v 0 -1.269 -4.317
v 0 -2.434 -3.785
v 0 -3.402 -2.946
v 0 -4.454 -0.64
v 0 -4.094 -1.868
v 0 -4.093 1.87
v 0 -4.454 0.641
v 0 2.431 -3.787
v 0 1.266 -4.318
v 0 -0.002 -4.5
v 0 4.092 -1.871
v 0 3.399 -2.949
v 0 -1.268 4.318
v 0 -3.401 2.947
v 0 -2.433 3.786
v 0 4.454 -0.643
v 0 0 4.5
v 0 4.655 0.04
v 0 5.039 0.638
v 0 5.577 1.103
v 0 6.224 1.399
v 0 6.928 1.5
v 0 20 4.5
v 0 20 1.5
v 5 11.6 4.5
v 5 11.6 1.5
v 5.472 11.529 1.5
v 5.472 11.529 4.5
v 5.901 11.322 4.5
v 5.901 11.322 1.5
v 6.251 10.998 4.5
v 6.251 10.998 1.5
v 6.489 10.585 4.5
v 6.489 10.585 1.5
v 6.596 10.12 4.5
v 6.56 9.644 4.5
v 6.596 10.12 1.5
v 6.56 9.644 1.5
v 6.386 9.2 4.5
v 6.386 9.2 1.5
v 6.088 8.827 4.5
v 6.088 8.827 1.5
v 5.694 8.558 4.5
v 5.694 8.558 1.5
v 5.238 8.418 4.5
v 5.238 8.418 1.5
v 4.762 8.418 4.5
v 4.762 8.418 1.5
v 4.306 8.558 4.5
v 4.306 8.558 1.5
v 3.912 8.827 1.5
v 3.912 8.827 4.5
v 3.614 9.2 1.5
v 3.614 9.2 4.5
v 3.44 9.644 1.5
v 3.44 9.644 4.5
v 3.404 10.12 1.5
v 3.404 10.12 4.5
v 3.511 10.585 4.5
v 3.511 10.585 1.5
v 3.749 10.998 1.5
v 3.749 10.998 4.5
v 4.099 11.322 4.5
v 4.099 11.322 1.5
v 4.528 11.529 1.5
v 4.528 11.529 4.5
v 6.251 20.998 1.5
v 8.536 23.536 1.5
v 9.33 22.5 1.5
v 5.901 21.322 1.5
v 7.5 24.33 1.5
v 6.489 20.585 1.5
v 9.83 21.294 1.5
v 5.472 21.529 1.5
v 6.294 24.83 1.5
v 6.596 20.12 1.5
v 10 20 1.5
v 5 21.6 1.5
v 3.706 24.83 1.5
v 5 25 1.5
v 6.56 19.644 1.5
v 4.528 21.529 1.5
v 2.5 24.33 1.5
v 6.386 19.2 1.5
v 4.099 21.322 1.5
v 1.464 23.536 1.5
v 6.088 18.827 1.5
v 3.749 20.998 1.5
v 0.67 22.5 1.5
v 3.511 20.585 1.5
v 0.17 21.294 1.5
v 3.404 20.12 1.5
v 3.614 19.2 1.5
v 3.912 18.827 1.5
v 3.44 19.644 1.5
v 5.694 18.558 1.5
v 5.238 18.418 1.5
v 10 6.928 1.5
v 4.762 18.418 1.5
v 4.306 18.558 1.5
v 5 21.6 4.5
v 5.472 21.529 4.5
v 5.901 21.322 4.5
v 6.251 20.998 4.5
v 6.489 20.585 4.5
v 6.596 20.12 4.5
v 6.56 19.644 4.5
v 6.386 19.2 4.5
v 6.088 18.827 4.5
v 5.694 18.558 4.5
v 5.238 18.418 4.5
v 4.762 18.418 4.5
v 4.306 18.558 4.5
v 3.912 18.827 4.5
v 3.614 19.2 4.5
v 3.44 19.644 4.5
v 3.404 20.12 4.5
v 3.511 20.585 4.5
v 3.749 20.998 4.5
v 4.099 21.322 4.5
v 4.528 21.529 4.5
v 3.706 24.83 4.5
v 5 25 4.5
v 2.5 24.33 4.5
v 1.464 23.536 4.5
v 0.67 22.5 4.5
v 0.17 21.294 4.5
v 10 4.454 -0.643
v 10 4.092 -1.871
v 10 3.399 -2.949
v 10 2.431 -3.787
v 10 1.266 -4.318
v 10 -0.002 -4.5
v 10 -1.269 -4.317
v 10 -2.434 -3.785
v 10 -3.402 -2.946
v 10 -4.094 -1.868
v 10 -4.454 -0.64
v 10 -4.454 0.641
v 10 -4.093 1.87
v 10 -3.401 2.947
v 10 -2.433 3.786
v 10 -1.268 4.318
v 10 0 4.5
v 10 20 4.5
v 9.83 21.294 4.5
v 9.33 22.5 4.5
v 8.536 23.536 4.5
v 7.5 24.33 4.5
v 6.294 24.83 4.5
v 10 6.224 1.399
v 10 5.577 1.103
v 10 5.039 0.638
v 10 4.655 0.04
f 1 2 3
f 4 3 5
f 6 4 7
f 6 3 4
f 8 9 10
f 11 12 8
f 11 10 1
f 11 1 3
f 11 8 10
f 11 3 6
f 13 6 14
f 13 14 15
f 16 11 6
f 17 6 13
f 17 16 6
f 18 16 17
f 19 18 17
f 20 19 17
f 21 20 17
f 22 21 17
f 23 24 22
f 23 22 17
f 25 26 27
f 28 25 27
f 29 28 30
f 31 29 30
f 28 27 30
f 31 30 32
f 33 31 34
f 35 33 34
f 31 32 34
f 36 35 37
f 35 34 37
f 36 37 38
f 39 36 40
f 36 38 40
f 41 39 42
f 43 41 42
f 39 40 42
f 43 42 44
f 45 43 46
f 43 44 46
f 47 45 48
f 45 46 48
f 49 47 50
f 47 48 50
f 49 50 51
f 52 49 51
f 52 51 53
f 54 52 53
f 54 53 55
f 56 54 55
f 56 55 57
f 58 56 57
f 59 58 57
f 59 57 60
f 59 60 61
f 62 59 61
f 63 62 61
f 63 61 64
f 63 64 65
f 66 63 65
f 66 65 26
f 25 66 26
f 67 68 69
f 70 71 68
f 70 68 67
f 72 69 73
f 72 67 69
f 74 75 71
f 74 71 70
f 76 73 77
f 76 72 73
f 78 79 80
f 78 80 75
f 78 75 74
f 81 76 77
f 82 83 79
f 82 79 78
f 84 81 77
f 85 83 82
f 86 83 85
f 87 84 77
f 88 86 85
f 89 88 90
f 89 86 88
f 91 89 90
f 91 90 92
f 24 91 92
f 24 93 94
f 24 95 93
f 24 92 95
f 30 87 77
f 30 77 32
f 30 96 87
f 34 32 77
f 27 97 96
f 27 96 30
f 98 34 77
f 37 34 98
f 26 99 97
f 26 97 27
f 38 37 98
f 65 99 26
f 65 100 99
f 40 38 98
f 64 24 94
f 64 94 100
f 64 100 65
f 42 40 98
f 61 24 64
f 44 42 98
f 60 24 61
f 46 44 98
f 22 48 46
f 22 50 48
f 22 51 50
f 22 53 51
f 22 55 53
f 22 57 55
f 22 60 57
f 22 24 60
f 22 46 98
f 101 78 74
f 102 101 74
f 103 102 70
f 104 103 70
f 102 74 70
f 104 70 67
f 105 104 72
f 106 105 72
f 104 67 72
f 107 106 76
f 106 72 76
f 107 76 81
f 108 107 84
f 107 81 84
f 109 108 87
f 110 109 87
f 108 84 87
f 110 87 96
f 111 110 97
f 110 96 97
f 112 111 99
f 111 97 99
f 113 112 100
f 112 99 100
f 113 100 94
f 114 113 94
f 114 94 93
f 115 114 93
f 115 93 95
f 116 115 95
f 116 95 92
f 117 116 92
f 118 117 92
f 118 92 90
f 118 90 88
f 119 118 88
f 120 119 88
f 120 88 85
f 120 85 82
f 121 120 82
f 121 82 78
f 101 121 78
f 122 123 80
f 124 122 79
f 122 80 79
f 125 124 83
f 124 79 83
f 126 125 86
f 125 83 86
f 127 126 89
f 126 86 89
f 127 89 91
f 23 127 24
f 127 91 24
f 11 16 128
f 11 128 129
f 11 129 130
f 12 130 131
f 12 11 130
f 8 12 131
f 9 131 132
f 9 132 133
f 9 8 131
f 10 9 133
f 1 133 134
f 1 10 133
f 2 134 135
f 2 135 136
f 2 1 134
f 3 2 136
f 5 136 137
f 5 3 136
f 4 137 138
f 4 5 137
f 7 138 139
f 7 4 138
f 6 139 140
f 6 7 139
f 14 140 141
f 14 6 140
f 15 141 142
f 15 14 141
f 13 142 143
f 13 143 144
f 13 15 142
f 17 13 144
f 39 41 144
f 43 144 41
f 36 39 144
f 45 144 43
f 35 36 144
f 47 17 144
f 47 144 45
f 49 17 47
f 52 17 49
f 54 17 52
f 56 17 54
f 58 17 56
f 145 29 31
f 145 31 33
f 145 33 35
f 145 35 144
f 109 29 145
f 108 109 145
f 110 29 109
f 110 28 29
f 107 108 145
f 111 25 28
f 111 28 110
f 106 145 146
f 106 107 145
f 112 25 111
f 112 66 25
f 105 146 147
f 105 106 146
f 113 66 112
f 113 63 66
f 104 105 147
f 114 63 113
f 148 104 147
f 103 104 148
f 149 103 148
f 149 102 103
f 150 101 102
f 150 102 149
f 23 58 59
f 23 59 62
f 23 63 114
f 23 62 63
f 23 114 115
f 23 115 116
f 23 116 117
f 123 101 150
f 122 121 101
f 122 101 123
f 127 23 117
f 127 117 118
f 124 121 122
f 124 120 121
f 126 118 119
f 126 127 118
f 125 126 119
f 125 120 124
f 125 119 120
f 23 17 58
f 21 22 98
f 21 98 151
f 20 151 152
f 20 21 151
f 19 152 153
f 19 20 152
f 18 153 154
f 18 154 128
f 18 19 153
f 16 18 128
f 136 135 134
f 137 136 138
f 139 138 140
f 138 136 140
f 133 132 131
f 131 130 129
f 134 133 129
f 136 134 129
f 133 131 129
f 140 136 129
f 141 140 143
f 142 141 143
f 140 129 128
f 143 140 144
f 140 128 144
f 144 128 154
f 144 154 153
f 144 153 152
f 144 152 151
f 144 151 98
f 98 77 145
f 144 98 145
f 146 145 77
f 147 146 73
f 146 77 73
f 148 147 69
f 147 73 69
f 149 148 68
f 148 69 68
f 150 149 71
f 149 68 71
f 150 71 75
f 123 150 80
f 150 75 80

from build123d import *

# Parameters (mm, degrees)
EXTRUDE_1_DEPTH     = 10
SKETCH_3_R          = 1.6
CUT_EXTRUDE_1_DEPTH = 28.586228448


with BuildPart() as part:
    # 草图2 → 凸台-拉伸1 (new body)
    with BuildSketch(Plane(origin=(0, 0, 0), x_dir=(0, 0, -1), z_dir=(1, 0, 0))):
        with BuildLine():
            Line((-4.5, 25), (-1.5, 25))
            Line((-1.5, 25), (-1.5, 6.92820323))
            ThreePointArc((-1.5, 6.92820323), (-0.889822365, 5.291569054), (0.642857143, 4.453844934))
            ThreePointArc((0.642857143, 4.453844934), (2.945941518, -3.401680257), (-4.5, 0))
            Line((-4.5, 0), (-4.5, 25))
        make_face()
    extrude(amount=EXTRUDE_1_DEPTH)

    # 草图3 → 切除-拉伸1 (cut, through all)
    with BuildSketch(Plane(origin=(0, 0, 1.5), x_dir=(-1, 0, 0), z_dir=(0, 0, -1))):
        with BuildLine():
            Line((-10, 25), (-10, 20))
            ThreePointArc((-10, 20), (-8.535533906, 23.535533906), (-5, 25))
            Line((-5, 25), (-10, 25))
        make_face()
        with BuildLine():
            Line((0, 25), (-5, 25))
            ThreePointArc((-5, 25), (-1.464466094, 23.535533906), (0, 20))
            Line((0, 20), (0, 25))
        make_face()
        with Locations(Location((-5, 20, 0), (0, 0, 90))):
            Circle(SKETCH_3_R)
        with Locations(Location((-5, 10, 0), (0, 0, 90))):
            Circle(SKETCH_3_R)
    extrude(amount=-CUT_EXTRUDE_1_DEPTH, mode=Mode.SUBTRACT)


solid = part.part
